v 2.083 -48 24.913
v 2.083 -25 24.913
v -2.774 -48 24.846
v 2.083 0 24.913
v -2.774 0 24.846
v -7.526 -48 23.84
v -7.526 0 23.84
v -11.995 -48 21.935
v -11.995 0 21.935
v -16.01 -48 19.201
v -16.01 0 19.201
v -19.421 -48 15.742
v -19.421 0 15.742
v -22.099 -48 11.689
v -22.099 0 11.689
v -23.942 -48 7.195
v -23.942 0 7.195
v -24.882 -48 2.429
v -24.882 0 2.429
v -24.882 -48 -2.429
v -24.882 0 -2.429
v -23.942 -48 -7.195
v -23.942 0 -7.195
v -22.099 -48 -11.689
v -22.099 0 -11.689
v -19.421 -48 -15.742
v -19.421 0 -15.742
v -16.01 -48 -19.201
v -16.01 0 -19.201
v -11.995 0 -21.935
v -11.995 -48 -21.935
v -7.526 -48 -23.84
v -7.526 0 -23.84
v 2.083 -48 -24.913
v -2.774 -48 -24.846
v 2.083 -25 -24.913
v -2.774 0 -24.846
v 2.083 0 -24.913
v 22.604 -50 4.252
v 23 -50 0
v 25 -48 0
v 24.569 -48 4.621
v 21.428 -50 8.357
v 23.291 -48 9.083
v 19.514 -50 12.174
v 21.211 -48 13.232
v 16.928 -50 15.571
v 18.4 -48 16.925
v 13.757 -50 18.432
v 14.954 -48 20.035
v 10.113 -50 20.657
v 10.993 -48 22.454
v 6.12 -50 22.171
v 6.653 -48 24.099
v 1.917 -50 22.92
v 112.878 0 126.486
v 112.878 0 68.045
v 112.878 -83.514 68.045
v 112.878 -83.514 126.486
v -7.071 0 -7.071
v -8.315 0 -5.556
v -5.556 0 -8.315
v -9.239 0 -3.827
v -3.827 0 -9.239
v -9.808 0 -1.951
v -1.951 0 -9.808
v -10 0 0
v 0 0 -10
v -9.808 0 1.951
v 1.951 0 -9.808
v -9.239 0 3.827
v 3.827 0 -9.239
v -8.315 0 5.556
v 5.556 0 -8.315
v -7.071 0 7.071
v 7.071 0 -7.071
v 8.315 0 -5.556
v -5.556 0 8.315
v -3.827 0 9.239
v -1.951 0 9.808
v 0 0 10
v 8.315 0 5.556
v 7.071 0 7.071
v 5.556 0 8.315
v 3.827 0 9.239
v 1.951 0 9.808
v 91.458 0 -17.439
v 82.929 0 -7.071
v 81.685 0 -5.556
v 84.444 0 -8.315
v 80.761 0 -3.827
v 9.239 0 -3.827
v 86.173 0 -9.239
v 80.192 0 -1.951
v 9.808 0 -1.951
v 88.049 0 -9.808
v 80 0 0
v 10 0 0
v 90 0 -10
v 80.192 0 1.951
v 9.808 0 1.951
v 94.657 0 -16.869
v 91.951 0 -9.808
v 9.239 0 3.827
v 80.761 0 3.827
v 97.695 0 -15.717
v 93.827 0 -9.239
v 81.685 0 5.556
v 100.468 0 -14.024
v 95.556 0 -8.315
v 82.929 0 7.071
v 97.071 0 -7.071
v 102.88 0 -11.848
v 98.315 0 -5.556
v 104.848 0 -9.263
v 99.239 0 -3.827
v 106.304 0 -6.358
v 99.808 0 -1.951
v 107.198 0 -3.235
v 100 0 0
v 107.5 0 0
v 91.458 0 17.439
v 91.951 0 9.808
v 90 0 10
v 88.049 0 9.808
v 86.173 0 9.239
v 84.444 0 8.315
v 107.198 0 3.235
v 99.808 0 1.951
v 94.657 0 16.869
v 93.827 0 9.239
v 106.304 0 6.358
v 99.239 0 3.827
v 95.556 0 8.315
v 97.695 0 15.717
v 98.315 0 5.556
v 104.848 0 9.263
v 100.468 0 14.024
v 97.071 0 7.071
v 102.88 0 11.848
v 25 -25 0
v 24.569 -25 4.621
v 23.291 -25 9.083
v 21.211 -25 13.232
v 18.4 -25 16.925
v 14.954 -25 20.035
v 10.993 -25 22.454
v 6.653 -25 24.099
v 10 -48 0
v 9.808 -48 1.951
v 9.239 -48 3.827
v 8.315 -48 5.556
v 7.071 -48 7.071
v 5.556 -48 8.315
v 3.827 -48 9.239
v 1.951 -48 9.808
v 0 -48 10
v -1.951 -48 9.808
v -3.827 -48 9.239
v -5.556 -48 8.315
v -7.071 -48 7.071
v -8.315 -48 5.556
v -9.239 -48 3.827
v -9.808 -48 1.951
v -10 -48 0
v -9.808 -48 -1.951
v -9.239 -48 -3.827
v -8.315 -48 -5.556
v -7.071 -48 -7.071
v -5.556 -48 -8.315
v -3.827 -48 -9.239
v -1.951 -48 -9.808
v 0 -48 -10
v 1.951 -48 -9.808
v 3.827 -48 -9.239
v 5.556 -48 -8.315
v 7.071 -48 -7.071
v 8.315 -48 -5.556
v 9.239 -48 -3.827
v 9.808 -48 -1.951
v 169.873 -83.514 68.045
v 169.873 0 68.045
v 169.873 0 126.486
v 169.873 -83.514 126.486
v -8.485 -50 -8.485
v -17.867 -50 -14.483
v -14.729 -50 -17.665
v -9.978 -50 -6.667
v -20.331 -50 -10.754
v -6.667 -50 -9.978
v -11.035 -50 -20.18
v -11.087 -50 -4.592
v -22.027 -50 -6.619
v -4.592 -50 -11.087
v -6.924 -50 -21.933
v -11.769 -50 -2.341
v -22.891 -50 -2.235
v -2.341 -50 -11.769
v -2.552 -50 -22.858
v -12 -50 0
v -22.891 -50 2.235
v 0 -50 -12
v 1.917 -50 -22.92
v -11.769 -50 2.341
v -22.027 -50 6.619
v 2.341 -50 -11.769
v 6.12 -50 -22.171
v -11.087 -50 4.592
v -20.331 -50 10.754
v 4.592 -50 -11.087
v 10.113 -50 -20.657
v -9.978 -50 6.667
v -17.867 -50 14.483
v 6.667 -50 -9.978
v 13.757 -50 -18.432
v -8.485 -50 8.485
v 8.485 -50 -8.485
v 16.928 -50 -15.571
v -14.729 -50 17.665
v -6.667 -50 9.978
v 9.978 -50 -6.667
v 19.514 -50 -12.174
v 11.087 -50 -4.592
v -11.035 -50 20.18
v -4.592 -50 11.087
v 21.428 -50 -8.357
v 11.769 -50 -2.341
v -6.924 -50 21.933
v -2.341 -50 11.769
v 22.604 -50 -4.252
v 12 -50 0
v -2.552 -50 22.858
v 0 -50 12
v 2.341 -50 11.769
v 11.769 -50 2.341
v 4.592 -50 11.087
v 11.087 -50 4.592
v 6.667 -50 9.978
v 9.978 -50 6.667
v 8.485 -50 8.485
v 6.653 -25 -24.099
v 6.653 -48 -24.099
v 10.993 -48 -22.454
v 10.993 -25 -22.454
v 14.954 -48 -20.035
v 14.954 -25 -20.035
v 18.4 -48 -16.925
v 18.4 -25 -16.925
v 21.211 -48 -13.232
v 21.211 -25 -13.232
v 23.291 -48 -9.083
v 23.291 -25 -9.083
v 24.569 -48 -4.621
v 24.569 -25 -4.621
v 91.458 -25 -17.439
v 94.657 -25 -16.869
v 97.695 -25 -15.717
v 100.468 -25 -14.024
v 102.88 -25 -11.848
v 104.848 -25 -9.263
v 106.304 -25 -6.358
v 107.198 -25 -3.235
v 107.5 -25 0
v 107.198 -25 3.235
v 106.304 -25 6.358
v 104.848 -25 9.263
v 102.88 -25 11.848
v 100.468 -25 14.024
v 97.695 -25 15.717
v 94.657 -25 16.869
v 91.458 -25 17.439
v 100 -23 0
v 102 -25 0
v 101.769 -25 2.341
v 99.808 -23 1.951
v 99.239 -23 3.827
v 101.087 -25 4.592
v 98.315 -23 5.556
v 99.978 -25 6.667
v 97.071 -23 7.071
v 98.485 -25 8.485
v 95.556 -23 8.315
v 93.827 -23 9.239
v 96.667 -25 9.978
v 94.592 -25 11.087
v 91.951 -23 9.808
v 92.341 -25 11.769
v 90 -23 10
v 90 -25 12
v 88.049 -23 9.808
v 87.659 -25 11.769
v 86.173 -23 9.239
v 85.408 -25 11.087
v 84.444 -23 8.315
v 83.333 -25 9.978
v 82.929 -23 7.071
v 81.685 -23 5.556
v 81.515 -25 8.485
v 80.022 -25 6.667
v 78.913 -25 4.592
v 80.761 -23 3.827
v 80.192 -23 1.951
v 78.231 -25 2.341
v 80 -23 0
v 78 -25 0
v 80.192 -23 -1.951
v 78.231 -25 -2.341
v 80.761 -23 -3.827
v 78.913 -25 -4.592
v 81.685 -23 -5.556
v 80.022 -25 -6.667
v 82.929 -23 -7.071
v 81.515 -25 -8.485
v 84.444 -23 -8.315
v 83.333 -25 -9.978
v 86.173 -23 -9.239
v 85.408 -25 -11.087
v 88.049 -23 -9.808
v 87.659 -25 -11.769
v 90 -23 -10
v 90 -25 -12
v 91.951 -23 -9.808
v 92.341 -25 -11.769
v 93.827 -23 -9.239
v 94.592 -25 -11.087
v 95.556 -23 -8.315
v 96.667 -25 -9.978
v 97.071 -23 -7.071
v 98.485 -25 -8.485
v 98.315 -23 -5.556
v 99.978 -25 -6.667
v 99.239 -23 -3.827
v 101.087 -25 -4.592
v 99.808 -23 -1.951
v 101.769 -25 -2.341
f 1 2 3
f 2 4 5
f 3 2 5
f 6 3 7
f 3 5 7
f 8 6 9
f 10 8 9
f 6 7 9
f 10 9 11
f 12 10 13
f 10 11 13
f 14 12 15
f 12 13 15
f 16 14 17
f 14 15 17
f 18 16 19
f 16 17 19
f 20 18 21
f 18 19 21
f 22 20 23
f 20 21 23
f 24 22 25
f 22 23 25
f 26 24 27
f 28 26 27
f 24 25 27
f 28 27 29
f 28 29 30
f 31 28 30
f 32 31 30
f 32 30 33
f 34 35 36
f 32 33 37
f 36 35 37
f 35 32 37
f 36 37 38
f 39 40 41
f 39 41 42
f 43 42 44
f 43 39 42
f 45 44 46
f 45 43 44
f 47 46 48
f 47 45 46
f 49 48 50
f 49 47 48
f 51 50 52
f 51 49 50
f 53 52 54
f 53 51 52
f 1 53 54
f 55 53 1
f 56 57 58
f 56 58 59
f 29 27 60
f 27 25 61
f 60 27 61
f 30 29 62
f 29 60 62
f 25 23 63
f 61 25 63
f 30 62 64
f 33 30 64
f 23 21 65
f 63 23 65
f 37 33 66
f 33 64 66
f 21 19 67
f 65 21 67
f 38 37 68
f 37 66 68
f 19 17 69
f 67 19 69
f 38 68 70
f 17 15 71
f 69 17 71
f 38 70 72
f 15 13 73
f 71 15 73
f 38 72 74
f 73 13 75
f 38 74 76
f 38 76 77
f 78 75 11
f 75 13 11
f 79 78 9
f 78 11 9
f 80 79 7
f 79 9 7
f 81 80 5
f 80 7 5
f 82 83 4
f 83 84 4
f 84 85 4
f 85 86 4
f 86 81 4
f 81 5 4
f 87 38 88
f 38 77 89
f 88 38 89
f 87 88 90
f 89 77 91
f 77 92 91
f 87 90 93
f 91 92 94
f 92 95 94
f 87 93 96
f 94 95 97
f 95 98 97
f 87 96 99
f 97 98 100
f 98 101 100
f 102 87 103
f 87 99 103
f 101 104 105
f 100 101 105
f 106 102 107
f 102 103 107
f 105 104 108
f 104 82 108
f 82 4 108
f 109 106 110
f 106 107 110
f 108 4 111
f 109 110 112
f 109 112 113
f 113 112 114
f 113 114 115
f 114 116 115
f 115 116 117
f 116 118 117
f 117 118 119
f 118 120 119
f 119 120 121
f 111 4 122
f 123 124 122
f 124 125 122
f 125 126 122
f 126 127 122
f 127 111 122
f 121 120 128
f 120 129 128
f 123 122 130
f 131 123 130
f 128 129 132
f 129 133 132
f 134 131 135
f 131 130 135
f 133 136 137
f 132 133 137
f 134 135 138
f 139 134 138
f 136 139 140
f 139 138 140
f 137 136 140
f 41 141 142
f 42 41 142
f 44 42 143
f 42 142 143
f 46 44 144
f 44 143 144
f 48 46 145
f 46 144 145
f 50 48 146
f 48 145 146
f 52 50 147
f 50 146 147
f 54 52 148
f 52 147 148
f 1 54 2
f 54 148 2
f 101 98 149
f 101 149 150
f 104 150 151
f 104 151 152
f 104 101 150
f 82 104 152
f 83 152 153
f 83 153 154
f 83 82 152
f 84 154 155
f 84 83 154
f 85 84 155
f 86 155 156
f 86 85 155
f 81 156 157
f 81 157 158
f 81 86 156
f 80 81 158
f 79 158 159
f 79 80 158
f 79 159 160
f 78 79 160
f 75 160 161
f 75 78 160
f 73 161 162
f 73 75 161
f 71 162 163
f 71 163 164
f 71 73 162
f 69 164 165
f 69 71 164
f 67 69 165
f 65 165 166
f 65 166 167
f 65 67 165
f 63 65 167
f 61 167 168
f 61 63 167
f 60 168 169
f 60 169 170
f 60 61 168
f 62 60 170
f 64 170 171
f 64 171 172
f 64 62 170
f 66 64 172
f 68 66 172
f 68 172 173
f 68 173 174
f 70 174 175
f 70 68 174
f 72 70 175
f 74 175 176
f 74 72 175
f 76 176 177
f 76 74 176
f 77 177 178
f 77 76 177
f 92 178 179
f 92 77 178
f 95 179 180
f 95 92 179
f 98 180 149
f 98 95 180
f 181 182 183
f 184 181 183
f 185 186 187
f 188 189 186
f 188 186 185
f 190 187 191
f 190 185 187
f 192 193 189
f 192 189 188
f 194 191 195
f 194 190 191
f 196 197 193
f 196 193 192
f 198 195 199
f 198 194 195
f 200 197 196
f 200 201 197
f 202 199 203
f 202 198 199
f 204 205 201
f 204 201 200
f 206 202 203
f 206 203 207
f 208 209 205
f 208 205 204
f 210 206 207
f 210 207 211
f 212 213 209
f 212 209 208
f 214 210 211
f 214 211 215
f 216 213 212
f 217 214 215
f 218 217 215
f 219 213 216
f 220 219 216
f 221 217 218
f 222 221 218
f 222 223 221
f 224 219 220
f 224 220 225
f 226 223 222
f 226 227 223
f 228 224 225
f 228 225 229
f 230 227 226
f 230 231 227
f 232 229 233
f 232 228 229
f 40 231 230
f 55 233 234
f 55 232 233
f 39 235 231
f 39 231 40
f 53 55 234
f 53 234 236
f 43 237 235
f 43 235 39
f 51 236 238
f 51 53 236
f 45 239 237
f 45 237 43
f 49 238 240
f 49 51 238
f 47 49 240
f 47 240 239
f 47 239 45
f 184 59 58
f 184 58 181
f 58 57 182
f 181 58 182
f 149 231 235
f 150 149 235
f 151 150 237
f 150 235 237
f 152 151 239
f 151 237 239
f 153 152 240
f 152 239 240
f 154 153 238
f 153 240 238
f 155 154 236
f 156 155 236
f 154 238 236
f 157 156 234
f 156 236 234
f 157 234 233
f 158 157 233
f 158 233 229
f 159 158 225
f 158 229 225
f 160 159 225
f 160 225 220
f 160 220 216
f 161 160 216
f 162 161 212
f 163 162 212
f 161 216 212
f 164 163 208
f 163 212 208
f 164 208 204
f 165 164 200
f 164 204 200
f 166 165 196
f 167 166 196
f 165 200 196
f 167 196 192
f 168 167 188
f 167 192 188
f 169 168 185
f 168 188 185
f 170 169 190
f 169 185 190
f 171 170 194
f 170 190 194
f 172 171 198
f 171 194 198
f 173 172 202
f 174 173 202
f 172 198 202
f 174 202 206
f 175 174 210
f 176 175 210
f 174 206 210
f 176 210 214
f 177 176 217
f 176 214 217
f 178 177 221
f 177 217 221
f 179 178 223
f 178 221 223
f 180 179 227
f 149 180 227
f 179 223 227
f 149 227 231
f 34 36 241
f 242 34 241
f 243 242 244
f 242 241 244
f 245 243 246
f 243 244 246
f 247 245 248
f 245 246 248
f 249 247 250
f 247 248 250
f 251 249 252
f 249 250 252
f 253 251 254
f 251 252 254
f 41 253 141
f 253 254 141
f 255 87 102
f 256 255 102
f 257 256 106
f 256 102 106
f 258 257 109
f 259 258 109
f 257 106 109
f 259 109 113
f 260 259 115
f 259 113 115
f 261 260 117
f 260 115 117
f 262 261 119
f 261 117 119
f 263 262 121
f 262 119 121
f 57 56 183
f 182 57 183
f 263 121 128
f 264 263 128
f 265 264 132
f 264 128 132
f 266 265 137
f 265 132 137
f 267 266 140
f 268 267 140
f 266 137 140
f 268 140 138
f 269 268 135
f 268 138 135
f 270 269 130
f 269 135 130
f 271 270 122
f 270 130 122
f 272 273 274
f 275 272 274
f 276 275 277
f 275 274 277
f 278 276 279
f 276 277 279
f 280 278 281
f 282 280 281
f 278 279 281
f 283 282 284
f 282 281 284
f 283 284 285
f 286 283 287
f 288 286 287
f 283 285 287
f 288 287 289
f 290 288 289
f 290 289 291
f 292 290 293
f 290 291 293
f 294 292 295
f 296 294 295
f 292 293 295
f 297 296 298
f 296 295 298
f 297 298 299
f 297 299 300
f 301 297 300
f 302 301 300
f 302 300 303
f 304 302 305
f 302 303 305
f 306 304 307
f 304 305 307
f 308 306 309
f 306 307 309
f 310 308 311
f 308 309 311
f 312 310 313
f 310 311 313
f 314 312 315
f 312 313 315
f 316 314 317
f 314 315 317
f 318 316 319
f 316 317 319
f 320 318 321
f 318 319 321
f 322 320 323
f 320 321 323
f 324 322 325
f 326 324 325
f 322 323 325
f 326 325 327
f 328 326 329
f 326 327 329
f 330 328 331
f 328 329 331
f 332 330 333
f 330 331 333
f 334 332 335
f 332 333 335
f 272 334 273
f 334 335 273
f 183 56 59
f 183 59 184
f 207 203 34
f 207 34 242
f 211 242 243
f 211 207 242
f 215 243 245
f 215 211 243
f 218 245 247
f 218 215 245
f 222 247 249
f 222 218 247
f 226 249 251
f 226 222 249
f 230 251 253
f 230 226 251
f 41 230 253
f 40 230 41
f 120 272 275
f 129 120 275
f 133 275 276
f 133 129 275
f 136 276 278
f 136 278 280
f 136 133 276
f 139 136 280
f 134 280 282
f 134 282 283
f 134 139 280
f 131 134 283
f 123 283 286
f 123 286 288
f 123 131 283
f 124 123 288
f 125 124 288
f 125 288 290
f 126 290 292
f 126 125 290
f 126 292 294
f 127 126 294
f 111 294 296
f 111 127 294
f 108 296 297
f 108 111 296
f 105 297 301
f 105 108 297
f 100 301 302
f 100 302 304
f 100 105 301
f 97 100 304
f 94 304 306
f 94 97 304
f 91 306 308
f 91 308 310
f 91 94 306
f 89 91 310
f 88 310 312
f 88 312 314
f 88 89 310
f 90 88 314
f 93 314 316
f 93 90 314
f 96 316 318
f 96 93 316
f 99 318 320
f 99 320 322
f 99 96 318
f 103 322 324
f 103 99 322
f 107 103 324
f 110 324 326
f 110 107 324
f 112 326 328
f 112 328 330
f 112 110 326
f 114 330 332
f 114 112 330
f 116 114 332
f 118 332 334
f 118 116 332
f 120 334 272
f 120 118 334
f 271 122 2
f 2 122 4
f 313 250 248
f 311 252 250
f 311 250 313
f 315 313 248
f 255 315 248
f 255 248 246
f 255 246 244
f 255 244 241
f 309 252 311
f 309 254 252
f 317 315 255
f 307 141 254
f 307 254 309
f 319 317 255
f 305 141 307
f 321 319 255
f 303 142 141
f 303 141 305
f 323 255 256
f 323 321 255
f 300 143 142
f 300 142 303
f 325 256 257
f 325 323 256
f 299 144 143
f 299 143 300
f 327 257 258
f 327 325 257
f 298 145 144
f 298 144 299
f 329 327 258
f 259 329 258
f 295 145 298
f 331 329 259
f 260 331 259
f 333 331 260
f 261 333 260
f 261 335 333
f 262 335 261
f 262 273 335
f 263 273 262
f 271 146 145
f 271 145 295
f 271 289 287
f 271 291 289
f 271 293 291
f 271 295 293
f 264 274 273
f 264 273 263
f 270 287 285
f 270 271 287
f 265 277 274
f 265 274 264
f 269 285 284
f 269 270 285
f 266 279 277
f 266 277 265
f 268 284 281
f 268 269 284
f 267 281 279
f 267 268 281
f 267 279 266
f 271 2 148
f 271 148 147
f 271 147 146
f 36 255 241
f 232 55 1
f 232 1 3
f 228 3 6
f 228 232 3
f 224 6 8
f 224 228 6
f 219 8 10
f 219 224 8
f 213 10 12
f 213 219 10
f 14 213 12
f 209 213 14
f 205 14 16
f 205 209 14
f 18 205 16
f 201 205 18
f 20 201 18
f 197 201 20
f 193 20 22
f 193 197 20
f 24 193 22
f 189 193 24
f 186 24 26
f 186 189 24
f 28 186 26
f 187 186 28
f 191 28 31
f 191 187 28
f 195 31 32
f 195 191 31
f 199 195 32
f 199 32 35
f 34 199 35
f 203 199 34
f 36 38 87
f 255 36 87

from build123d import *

# Parameters (mm, degrees)
F0_R     = 10
F1_DEPTH = 25
F2_DEPTH = 50
F3_SIZE  = 2
F4_W     = 56.994885
F4_H     = 58.440619
F5_DEPTH = 83.513869


with BuildPart() as f1:
    # F0 (on Front) → F1 (new body)
    with BuildSketch(Plane.XZ):
        with BuildLine():
            ThreePointArc((2.083333, -24.913043), (18.399502, -16.92508), (25, 0))
            ThreePointArc((25, 0), (18.399502, 16.92508), (2.083333, 24.913043))
            ThreePointArc((2.083333, 24.913043), (-25, 0), (2.083333, -24.913043))
        make_face()
        Circle(F0_R, mode=Mode.SUBTRACT)
        with BuildLine():
            ThreePointArc((2.083333, 24.913043), (18.399502, 16.92508), (25, 0))
            ThreePointArc((25, 0), (18.399502, -16.92508), (2.083333, -24.913043))
            Line((2.083333, -24.913043), (91.458333, -17.43913))
            ThreePointArc((91.458333, -17.43913), (72.5, 0), (91.458333, 17.43913))
            Line((91.458333, 17.43913), (2.083333, 24.913043))
        make_face()
        with BuildLine():
            ThreePointArc((107.5, 0), (102.879651, 11.847556), (91.458333, 17.43913))
            ThreePointArc((91.458333, 17.43913), (72.5, 0), (91.458333, -17.43913))
            ThreePointArc((91.458333, -17.43913), (102.879651, -11.847556), (107.5, 0))
        make_face()
        with Locations((90, 0)):
            Circle(F0_R, mode=Mode.SUBTRACT)
    extrude(amount=F1_DEPTH)

    # F0 (on Front) → F2 (join)
    with BuildSketch(Plane.XZ):
        with BuildLine():
            ThreePointArc((2.083333, -24.913043), (18.399502, -16.92508), (25, 0))
            ThreePointArc((25, 0), (18.399502, 16.92508), (2.083333, 24.913043))
            ThreePointArc((2.083333, 24.913043), (-25, 0), (2.083333, -24.913043))
        make_face()
        Circle(F0_R, mode=Mode.SUBTRACT)
    extrude(amount=F2_DEPTH)

    # F3
    f3_edges = [f1.edges().sort_by_distance(p)[0] for p in [
        (-2.083333, -50, 24.913043),
        (-10, -50, 0),
        (80, -25, 0),
    ]]
    chamfer(f3_edges, length=F3_SIZE)


with BuildPart() as f5:
    # F4 (on face) → F5 (new body)
    with BuildSketch(Plane.XZ):
        with Locations((141.375228, 97.265515)):
            Rectangle(F4_W, F4_H)
    extrude(amount=F5_DEPTH)


solid = Compound([f1.part, f5.part])
